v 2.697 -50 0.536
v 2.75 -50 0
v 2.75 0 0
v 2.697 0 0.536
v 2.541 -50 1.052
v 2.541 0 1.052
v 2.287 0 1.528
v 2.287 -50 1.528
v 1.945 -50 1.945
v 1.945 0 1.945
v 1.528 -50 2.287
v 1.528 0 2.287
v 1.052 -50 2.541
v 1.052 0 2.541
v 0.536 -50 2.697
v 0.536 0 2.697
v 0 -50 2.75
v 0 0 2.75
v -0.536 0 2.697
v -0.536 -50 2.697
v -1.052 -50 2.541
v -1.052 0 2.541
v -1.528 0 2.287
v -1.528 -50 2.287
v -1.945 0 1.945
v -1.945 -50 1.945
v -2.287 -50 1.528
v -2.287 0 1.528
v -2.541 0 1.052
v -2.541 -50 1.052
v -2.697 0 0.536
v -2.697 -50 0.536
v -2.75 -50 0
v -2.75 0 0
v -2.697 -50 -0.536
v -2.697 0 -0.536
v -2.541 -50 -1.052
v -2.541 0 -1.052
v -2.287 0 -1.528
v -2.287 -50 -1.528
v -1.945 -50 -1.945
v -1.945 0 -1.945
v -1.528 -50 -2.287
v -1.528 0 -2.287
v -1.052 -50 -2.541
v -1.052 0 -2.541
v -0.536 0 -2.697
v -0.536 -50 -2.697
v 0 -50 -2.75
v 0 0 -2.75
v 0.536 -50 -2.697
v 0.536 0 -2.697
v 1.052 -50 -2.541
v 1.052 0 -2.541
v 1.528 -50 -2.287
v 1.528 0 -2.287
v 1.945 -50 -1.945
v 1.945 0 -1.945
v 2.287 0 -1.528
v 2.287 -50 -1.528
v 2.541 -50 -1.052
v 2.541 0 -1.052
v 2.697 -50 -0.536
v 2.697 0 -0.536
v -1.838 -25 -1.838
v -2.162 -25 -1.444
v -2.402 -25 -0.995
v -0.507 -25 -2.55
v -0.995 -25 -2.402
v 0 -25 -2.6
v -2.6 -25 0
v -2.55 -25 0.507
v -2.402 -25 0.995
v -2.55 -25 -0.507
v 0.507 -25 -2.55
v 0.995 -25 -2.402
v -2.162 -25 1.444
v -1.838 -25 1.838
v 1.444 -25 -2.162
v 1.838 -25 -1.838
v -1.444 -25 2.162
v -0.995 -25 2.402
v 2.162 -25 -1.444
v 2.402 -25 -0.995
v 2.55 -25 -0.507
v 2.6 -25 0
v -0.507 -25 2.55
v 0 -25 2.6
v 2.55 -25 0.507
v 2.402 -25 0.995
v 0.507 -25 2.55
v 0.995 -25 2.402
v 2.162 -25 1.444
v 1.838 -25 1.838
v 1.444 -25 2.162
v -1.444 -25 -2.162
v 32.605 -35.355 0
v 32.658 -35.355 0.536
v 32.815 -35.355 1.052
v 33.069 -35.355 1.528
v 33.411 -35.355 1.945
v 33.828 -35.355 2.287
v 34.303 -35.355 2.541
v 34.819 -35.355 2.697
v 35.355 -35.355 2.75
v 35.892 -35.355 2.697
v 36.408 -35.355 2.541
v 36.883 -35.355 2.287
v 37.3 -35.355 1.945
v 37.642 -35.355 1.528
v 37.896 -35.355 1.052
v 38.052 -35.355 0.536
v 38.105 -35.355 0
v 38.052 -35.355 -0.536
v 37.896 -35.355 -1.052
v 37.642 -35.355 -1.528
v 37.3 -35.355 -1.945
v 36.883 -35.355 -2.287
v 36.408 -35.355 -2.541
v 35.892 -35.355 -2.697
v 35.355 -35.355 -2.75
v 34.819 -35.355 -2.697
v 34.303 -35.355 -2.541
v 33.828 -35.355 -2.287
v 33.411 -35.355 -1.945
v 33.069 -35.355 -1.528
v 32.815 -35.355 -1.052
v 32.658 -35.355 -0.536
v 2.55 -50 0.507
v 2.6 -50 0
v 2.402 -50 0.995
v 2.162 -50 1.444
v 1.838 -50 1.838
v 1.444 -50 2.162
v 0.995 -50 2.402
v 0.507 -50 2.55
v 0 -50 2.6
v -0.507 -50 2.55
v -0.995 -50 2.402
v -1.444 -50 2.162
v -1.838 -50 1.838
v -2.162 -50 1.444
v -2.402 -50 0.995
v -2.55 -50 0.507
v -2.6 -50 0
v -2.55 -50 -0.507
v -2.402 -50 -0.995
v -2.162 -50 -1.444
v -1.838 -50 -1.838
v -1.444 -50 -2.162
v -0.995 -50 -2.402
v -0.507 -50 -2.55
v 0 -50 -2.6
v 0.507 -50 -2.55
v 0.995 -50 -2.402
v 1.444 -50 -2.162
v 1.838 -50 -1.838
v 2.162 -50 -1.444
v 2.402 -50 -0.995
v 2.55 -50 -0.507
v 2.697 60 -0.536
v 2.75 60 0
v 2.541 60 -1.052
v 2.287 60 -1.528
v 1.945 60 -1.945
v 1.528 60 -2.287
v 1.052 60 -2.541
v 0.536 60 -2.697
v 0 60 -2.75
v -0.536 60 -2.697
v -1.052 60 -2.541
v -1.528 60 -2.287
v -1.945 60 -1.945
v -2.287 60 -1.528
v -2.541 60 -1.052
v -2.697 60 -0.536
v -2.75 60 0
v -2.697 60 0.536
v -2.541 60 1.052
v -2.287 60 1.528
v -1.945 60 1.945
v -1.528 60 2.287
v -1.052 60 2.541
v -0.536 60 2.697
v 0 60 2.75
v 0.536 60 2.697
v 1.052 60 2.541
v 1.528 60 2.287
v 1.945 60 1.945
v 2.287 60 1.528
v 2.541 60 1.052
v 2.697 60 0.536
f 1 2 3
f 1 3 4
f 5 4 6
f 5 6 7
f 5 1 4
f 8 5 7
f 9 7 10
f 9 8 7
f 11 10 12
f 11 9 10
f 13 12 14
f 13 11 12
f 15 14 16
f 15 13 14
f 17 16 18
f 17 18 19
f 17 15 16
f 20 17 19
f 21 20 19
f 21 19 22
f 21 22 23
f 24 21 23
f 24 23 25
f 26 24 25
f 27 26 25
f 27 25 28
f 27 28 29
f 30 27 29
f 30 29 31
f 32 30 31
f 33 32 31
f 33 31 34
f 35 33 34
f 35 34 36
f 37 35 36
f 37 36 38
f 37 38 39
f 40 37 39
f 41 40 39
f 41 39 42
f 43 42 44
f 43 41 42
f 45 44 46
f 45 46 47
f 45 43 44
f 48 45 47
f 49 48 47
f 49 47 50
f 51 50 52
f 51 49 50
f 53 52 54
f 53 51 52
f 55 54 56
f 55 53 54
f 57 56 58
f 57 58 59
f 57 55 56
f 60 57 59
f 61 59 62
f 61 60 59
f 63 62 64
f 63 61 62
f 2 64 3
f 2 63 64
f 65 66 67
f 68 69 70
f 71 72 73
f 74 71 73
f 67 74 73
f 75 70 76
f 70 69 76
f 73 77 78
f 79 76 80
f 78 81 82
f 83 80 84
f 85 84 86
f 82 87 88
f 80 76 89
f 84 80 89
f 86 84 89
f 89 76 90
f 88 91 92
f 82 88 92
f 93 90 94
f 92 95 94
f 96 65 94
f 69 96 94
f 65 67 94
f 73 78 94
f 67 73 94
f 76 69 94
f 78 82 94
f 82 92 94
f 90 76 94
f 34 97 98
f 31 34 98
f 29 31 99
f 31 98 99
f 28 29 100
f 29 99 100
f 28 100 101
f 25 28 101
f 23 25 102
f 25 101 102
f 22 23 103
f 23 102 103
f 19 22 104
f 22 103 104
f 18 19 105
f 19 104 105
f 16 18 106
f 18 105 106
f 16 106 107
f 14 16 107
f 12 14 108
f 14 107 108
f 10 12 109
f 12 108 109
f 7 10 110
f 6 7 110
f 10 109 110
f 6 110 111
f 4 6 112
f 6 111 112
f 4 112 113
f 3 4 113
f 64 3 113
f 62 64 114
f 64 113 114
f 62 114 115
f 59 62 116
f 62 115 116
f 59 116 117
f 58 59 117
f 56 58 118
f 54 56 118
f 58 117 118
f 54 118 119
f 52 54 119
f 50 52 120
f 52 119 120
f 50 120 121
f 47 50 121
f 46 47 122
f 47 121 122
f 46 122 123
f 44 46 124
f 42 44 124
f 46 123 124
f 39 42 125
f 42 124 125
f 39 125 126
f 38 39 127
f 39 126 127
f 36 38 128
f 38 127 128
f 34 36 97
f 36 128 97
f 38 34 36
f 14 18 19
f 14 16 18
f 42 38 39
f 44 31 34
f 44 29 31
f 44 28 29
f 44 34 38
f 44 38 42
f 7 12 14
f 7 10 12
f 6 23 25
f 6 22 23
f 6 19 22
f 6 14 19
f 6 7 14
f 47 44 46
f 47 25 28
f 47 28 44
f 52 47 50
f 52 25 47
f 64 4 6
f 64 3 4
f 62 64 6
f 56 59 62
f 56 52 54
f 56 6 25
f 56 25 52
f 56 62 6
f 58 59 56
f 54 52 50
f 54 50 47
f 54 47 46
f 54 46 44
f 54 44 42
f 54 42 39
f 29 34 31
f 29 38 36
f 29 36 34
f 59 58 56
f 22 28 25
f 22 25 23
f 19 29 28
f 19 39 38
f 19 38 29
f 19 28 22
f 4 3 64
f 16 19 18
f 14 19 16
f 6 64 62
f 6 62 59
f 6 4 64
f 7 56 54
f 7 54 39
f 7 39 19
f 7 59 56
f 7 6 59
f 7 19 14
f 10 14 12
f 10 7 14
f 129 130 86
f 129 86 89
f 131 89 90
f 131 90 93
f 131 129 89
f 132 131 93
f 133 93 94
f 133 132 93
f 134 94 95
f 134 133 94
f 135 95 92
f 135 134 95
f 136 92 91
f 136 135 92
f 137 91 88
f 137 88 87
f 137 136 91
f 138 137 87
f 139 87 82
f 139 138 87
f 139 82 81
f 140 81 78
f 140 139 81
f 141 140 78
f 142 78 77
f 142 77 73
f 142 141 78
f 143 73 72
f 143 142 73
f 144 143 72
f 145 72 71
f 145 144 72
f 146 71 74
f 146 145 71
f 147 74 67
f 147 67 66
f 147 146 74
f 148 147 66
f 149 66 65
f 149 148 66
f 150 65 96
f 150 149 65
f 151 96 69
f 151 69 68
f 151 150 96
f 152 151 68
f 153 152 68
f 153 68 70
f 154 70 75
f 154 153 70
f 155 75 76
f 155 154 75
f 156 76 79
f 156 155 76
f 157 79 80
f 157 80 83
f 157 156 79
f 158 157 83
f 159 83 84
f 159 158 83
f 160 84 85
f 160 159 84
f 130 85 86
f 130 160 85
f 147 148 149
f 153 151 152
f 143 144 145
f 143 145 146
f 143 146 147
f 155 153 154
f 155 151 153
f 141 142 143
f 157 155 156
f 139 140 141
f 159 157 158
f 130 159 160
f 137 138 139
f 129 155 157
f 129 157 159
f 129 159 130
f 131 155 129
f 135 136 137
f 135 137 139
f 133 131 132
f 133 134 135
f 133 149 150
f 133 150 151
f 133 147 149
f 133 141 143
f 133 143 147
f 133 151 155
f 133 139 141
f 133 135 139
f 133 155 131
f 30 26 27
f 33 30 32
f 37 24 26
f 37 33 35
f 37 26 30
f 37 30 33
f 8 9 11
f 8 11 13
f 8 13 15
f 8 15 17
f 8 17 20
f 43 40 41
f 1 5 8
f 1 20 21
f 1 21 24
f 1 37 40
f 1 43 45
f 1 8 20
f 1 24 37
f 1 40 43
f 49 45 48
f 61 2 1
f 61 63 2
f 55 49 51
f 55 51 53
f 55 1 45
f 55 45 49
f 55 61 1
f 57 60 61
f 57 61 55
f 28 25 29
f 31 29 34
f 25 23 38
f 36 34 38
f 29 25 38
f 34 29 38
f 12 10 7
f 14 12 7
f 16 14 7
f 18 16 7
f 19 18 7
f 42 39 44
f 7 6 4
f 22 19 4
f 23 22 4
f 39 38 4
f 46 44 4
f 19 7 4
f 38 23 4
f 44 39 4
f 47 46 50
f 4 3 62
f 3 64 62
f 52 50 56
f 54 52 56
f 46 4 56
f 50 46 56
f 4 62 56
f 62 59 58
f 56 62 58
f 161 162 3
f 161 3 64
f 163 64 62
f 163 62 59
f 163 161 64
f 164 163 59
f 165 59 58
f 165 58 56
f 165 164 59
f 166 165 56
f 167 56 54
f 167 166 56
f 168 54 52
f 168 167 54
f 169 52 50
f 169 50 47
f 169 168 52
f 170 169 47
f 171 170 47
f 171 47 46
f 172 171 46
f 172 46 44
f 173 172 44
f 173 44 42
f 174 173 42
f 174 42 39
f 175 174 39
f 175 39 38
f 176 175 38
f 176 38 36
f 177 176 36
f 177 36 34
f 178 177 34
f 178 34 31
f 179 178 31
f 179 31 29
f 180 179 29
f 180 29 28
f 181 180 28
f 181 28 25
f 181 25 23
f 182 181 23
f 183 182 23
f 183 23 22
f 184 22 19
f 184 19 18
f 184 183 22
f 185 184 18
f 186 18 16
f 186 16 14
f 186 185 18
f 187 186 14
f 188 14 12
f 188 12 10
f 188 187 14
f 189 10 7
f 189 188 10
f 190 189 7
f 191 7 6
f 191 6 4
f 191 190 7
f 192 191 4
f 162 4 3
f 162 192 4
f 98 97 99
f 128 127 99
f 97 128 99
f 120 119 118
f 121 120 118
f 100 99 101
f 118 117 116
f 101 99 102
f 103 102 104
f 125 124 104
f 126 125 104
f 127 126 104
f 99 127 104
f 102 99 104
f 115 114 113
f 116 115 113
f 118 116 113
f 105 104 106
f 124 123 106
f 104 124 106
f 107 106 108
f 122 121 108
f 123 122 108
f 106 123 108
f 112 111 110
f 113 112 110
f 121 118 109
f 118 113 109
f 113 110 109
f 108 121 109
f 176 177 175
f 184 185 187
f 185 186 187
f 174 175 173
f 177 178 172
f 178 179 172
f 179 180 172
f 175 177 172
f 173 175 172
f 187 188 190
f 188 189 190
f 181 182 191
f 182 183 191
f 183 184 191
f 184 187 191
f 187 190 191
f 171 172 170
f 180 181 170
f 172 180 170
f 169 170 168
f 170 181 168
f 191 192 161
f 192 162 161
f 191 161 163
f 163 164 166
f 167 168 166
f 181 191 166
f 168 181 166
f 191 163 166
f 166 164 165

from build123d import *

# Parameters (mm, degrees)
F1_R      = 2.75
F2_FACE_R = 2.75
F5_R      = 2.6
F6_DEPTH  = 25


with BuildPart() as f2:
    # F2: sweep along a path in F0
    with BuildLine(Plane.XY) as f2_path:
        Line((0, 0), (0, -50))
    # F1 (on Front) → F2 (sweep)
    with BuildSketch(Plane.XZ):
        Circle(F1_R)
    sweep(path=f2_path.line)


with BuildPart() as f3:
    # F3: sweep along a path in F0
    with BuildLine(Plane.XY) as f3_path:
        Line((0, 0), (35.355339, -35.355339))
    # F2_face (on face) → F3 (sweep)
    with BuildSketch(Plane(origin=(0, 0, 0), x_dir=(-1, 0, 0), z_dir=(0, 1, 0))):
        Circle(F2_FACE_R)
    sweep(path=f3_path.line)


with BuildPart() as f4:
    # F4: sweep along a path in F0
    with BuildLine(Plane.XY) as f4_path:
        Line((0, 0), (0, 60))
    # F1 (on Front) → F4 (sweep)
    with BuildSketch(Plane.XZ):
        Circle(F1_R)
    sweep(path=f4_path.line)


with BuildPart() as f6:
    # F5 (on face) → F6 (new body)
    with BuildSketch(Plane.XZ.offset(50)):
        Circle(F5_R)
    extrude(amount=-F6_DEPTH)


solid = Compound([f2.part, f3.part, f4.part, f6.part])
